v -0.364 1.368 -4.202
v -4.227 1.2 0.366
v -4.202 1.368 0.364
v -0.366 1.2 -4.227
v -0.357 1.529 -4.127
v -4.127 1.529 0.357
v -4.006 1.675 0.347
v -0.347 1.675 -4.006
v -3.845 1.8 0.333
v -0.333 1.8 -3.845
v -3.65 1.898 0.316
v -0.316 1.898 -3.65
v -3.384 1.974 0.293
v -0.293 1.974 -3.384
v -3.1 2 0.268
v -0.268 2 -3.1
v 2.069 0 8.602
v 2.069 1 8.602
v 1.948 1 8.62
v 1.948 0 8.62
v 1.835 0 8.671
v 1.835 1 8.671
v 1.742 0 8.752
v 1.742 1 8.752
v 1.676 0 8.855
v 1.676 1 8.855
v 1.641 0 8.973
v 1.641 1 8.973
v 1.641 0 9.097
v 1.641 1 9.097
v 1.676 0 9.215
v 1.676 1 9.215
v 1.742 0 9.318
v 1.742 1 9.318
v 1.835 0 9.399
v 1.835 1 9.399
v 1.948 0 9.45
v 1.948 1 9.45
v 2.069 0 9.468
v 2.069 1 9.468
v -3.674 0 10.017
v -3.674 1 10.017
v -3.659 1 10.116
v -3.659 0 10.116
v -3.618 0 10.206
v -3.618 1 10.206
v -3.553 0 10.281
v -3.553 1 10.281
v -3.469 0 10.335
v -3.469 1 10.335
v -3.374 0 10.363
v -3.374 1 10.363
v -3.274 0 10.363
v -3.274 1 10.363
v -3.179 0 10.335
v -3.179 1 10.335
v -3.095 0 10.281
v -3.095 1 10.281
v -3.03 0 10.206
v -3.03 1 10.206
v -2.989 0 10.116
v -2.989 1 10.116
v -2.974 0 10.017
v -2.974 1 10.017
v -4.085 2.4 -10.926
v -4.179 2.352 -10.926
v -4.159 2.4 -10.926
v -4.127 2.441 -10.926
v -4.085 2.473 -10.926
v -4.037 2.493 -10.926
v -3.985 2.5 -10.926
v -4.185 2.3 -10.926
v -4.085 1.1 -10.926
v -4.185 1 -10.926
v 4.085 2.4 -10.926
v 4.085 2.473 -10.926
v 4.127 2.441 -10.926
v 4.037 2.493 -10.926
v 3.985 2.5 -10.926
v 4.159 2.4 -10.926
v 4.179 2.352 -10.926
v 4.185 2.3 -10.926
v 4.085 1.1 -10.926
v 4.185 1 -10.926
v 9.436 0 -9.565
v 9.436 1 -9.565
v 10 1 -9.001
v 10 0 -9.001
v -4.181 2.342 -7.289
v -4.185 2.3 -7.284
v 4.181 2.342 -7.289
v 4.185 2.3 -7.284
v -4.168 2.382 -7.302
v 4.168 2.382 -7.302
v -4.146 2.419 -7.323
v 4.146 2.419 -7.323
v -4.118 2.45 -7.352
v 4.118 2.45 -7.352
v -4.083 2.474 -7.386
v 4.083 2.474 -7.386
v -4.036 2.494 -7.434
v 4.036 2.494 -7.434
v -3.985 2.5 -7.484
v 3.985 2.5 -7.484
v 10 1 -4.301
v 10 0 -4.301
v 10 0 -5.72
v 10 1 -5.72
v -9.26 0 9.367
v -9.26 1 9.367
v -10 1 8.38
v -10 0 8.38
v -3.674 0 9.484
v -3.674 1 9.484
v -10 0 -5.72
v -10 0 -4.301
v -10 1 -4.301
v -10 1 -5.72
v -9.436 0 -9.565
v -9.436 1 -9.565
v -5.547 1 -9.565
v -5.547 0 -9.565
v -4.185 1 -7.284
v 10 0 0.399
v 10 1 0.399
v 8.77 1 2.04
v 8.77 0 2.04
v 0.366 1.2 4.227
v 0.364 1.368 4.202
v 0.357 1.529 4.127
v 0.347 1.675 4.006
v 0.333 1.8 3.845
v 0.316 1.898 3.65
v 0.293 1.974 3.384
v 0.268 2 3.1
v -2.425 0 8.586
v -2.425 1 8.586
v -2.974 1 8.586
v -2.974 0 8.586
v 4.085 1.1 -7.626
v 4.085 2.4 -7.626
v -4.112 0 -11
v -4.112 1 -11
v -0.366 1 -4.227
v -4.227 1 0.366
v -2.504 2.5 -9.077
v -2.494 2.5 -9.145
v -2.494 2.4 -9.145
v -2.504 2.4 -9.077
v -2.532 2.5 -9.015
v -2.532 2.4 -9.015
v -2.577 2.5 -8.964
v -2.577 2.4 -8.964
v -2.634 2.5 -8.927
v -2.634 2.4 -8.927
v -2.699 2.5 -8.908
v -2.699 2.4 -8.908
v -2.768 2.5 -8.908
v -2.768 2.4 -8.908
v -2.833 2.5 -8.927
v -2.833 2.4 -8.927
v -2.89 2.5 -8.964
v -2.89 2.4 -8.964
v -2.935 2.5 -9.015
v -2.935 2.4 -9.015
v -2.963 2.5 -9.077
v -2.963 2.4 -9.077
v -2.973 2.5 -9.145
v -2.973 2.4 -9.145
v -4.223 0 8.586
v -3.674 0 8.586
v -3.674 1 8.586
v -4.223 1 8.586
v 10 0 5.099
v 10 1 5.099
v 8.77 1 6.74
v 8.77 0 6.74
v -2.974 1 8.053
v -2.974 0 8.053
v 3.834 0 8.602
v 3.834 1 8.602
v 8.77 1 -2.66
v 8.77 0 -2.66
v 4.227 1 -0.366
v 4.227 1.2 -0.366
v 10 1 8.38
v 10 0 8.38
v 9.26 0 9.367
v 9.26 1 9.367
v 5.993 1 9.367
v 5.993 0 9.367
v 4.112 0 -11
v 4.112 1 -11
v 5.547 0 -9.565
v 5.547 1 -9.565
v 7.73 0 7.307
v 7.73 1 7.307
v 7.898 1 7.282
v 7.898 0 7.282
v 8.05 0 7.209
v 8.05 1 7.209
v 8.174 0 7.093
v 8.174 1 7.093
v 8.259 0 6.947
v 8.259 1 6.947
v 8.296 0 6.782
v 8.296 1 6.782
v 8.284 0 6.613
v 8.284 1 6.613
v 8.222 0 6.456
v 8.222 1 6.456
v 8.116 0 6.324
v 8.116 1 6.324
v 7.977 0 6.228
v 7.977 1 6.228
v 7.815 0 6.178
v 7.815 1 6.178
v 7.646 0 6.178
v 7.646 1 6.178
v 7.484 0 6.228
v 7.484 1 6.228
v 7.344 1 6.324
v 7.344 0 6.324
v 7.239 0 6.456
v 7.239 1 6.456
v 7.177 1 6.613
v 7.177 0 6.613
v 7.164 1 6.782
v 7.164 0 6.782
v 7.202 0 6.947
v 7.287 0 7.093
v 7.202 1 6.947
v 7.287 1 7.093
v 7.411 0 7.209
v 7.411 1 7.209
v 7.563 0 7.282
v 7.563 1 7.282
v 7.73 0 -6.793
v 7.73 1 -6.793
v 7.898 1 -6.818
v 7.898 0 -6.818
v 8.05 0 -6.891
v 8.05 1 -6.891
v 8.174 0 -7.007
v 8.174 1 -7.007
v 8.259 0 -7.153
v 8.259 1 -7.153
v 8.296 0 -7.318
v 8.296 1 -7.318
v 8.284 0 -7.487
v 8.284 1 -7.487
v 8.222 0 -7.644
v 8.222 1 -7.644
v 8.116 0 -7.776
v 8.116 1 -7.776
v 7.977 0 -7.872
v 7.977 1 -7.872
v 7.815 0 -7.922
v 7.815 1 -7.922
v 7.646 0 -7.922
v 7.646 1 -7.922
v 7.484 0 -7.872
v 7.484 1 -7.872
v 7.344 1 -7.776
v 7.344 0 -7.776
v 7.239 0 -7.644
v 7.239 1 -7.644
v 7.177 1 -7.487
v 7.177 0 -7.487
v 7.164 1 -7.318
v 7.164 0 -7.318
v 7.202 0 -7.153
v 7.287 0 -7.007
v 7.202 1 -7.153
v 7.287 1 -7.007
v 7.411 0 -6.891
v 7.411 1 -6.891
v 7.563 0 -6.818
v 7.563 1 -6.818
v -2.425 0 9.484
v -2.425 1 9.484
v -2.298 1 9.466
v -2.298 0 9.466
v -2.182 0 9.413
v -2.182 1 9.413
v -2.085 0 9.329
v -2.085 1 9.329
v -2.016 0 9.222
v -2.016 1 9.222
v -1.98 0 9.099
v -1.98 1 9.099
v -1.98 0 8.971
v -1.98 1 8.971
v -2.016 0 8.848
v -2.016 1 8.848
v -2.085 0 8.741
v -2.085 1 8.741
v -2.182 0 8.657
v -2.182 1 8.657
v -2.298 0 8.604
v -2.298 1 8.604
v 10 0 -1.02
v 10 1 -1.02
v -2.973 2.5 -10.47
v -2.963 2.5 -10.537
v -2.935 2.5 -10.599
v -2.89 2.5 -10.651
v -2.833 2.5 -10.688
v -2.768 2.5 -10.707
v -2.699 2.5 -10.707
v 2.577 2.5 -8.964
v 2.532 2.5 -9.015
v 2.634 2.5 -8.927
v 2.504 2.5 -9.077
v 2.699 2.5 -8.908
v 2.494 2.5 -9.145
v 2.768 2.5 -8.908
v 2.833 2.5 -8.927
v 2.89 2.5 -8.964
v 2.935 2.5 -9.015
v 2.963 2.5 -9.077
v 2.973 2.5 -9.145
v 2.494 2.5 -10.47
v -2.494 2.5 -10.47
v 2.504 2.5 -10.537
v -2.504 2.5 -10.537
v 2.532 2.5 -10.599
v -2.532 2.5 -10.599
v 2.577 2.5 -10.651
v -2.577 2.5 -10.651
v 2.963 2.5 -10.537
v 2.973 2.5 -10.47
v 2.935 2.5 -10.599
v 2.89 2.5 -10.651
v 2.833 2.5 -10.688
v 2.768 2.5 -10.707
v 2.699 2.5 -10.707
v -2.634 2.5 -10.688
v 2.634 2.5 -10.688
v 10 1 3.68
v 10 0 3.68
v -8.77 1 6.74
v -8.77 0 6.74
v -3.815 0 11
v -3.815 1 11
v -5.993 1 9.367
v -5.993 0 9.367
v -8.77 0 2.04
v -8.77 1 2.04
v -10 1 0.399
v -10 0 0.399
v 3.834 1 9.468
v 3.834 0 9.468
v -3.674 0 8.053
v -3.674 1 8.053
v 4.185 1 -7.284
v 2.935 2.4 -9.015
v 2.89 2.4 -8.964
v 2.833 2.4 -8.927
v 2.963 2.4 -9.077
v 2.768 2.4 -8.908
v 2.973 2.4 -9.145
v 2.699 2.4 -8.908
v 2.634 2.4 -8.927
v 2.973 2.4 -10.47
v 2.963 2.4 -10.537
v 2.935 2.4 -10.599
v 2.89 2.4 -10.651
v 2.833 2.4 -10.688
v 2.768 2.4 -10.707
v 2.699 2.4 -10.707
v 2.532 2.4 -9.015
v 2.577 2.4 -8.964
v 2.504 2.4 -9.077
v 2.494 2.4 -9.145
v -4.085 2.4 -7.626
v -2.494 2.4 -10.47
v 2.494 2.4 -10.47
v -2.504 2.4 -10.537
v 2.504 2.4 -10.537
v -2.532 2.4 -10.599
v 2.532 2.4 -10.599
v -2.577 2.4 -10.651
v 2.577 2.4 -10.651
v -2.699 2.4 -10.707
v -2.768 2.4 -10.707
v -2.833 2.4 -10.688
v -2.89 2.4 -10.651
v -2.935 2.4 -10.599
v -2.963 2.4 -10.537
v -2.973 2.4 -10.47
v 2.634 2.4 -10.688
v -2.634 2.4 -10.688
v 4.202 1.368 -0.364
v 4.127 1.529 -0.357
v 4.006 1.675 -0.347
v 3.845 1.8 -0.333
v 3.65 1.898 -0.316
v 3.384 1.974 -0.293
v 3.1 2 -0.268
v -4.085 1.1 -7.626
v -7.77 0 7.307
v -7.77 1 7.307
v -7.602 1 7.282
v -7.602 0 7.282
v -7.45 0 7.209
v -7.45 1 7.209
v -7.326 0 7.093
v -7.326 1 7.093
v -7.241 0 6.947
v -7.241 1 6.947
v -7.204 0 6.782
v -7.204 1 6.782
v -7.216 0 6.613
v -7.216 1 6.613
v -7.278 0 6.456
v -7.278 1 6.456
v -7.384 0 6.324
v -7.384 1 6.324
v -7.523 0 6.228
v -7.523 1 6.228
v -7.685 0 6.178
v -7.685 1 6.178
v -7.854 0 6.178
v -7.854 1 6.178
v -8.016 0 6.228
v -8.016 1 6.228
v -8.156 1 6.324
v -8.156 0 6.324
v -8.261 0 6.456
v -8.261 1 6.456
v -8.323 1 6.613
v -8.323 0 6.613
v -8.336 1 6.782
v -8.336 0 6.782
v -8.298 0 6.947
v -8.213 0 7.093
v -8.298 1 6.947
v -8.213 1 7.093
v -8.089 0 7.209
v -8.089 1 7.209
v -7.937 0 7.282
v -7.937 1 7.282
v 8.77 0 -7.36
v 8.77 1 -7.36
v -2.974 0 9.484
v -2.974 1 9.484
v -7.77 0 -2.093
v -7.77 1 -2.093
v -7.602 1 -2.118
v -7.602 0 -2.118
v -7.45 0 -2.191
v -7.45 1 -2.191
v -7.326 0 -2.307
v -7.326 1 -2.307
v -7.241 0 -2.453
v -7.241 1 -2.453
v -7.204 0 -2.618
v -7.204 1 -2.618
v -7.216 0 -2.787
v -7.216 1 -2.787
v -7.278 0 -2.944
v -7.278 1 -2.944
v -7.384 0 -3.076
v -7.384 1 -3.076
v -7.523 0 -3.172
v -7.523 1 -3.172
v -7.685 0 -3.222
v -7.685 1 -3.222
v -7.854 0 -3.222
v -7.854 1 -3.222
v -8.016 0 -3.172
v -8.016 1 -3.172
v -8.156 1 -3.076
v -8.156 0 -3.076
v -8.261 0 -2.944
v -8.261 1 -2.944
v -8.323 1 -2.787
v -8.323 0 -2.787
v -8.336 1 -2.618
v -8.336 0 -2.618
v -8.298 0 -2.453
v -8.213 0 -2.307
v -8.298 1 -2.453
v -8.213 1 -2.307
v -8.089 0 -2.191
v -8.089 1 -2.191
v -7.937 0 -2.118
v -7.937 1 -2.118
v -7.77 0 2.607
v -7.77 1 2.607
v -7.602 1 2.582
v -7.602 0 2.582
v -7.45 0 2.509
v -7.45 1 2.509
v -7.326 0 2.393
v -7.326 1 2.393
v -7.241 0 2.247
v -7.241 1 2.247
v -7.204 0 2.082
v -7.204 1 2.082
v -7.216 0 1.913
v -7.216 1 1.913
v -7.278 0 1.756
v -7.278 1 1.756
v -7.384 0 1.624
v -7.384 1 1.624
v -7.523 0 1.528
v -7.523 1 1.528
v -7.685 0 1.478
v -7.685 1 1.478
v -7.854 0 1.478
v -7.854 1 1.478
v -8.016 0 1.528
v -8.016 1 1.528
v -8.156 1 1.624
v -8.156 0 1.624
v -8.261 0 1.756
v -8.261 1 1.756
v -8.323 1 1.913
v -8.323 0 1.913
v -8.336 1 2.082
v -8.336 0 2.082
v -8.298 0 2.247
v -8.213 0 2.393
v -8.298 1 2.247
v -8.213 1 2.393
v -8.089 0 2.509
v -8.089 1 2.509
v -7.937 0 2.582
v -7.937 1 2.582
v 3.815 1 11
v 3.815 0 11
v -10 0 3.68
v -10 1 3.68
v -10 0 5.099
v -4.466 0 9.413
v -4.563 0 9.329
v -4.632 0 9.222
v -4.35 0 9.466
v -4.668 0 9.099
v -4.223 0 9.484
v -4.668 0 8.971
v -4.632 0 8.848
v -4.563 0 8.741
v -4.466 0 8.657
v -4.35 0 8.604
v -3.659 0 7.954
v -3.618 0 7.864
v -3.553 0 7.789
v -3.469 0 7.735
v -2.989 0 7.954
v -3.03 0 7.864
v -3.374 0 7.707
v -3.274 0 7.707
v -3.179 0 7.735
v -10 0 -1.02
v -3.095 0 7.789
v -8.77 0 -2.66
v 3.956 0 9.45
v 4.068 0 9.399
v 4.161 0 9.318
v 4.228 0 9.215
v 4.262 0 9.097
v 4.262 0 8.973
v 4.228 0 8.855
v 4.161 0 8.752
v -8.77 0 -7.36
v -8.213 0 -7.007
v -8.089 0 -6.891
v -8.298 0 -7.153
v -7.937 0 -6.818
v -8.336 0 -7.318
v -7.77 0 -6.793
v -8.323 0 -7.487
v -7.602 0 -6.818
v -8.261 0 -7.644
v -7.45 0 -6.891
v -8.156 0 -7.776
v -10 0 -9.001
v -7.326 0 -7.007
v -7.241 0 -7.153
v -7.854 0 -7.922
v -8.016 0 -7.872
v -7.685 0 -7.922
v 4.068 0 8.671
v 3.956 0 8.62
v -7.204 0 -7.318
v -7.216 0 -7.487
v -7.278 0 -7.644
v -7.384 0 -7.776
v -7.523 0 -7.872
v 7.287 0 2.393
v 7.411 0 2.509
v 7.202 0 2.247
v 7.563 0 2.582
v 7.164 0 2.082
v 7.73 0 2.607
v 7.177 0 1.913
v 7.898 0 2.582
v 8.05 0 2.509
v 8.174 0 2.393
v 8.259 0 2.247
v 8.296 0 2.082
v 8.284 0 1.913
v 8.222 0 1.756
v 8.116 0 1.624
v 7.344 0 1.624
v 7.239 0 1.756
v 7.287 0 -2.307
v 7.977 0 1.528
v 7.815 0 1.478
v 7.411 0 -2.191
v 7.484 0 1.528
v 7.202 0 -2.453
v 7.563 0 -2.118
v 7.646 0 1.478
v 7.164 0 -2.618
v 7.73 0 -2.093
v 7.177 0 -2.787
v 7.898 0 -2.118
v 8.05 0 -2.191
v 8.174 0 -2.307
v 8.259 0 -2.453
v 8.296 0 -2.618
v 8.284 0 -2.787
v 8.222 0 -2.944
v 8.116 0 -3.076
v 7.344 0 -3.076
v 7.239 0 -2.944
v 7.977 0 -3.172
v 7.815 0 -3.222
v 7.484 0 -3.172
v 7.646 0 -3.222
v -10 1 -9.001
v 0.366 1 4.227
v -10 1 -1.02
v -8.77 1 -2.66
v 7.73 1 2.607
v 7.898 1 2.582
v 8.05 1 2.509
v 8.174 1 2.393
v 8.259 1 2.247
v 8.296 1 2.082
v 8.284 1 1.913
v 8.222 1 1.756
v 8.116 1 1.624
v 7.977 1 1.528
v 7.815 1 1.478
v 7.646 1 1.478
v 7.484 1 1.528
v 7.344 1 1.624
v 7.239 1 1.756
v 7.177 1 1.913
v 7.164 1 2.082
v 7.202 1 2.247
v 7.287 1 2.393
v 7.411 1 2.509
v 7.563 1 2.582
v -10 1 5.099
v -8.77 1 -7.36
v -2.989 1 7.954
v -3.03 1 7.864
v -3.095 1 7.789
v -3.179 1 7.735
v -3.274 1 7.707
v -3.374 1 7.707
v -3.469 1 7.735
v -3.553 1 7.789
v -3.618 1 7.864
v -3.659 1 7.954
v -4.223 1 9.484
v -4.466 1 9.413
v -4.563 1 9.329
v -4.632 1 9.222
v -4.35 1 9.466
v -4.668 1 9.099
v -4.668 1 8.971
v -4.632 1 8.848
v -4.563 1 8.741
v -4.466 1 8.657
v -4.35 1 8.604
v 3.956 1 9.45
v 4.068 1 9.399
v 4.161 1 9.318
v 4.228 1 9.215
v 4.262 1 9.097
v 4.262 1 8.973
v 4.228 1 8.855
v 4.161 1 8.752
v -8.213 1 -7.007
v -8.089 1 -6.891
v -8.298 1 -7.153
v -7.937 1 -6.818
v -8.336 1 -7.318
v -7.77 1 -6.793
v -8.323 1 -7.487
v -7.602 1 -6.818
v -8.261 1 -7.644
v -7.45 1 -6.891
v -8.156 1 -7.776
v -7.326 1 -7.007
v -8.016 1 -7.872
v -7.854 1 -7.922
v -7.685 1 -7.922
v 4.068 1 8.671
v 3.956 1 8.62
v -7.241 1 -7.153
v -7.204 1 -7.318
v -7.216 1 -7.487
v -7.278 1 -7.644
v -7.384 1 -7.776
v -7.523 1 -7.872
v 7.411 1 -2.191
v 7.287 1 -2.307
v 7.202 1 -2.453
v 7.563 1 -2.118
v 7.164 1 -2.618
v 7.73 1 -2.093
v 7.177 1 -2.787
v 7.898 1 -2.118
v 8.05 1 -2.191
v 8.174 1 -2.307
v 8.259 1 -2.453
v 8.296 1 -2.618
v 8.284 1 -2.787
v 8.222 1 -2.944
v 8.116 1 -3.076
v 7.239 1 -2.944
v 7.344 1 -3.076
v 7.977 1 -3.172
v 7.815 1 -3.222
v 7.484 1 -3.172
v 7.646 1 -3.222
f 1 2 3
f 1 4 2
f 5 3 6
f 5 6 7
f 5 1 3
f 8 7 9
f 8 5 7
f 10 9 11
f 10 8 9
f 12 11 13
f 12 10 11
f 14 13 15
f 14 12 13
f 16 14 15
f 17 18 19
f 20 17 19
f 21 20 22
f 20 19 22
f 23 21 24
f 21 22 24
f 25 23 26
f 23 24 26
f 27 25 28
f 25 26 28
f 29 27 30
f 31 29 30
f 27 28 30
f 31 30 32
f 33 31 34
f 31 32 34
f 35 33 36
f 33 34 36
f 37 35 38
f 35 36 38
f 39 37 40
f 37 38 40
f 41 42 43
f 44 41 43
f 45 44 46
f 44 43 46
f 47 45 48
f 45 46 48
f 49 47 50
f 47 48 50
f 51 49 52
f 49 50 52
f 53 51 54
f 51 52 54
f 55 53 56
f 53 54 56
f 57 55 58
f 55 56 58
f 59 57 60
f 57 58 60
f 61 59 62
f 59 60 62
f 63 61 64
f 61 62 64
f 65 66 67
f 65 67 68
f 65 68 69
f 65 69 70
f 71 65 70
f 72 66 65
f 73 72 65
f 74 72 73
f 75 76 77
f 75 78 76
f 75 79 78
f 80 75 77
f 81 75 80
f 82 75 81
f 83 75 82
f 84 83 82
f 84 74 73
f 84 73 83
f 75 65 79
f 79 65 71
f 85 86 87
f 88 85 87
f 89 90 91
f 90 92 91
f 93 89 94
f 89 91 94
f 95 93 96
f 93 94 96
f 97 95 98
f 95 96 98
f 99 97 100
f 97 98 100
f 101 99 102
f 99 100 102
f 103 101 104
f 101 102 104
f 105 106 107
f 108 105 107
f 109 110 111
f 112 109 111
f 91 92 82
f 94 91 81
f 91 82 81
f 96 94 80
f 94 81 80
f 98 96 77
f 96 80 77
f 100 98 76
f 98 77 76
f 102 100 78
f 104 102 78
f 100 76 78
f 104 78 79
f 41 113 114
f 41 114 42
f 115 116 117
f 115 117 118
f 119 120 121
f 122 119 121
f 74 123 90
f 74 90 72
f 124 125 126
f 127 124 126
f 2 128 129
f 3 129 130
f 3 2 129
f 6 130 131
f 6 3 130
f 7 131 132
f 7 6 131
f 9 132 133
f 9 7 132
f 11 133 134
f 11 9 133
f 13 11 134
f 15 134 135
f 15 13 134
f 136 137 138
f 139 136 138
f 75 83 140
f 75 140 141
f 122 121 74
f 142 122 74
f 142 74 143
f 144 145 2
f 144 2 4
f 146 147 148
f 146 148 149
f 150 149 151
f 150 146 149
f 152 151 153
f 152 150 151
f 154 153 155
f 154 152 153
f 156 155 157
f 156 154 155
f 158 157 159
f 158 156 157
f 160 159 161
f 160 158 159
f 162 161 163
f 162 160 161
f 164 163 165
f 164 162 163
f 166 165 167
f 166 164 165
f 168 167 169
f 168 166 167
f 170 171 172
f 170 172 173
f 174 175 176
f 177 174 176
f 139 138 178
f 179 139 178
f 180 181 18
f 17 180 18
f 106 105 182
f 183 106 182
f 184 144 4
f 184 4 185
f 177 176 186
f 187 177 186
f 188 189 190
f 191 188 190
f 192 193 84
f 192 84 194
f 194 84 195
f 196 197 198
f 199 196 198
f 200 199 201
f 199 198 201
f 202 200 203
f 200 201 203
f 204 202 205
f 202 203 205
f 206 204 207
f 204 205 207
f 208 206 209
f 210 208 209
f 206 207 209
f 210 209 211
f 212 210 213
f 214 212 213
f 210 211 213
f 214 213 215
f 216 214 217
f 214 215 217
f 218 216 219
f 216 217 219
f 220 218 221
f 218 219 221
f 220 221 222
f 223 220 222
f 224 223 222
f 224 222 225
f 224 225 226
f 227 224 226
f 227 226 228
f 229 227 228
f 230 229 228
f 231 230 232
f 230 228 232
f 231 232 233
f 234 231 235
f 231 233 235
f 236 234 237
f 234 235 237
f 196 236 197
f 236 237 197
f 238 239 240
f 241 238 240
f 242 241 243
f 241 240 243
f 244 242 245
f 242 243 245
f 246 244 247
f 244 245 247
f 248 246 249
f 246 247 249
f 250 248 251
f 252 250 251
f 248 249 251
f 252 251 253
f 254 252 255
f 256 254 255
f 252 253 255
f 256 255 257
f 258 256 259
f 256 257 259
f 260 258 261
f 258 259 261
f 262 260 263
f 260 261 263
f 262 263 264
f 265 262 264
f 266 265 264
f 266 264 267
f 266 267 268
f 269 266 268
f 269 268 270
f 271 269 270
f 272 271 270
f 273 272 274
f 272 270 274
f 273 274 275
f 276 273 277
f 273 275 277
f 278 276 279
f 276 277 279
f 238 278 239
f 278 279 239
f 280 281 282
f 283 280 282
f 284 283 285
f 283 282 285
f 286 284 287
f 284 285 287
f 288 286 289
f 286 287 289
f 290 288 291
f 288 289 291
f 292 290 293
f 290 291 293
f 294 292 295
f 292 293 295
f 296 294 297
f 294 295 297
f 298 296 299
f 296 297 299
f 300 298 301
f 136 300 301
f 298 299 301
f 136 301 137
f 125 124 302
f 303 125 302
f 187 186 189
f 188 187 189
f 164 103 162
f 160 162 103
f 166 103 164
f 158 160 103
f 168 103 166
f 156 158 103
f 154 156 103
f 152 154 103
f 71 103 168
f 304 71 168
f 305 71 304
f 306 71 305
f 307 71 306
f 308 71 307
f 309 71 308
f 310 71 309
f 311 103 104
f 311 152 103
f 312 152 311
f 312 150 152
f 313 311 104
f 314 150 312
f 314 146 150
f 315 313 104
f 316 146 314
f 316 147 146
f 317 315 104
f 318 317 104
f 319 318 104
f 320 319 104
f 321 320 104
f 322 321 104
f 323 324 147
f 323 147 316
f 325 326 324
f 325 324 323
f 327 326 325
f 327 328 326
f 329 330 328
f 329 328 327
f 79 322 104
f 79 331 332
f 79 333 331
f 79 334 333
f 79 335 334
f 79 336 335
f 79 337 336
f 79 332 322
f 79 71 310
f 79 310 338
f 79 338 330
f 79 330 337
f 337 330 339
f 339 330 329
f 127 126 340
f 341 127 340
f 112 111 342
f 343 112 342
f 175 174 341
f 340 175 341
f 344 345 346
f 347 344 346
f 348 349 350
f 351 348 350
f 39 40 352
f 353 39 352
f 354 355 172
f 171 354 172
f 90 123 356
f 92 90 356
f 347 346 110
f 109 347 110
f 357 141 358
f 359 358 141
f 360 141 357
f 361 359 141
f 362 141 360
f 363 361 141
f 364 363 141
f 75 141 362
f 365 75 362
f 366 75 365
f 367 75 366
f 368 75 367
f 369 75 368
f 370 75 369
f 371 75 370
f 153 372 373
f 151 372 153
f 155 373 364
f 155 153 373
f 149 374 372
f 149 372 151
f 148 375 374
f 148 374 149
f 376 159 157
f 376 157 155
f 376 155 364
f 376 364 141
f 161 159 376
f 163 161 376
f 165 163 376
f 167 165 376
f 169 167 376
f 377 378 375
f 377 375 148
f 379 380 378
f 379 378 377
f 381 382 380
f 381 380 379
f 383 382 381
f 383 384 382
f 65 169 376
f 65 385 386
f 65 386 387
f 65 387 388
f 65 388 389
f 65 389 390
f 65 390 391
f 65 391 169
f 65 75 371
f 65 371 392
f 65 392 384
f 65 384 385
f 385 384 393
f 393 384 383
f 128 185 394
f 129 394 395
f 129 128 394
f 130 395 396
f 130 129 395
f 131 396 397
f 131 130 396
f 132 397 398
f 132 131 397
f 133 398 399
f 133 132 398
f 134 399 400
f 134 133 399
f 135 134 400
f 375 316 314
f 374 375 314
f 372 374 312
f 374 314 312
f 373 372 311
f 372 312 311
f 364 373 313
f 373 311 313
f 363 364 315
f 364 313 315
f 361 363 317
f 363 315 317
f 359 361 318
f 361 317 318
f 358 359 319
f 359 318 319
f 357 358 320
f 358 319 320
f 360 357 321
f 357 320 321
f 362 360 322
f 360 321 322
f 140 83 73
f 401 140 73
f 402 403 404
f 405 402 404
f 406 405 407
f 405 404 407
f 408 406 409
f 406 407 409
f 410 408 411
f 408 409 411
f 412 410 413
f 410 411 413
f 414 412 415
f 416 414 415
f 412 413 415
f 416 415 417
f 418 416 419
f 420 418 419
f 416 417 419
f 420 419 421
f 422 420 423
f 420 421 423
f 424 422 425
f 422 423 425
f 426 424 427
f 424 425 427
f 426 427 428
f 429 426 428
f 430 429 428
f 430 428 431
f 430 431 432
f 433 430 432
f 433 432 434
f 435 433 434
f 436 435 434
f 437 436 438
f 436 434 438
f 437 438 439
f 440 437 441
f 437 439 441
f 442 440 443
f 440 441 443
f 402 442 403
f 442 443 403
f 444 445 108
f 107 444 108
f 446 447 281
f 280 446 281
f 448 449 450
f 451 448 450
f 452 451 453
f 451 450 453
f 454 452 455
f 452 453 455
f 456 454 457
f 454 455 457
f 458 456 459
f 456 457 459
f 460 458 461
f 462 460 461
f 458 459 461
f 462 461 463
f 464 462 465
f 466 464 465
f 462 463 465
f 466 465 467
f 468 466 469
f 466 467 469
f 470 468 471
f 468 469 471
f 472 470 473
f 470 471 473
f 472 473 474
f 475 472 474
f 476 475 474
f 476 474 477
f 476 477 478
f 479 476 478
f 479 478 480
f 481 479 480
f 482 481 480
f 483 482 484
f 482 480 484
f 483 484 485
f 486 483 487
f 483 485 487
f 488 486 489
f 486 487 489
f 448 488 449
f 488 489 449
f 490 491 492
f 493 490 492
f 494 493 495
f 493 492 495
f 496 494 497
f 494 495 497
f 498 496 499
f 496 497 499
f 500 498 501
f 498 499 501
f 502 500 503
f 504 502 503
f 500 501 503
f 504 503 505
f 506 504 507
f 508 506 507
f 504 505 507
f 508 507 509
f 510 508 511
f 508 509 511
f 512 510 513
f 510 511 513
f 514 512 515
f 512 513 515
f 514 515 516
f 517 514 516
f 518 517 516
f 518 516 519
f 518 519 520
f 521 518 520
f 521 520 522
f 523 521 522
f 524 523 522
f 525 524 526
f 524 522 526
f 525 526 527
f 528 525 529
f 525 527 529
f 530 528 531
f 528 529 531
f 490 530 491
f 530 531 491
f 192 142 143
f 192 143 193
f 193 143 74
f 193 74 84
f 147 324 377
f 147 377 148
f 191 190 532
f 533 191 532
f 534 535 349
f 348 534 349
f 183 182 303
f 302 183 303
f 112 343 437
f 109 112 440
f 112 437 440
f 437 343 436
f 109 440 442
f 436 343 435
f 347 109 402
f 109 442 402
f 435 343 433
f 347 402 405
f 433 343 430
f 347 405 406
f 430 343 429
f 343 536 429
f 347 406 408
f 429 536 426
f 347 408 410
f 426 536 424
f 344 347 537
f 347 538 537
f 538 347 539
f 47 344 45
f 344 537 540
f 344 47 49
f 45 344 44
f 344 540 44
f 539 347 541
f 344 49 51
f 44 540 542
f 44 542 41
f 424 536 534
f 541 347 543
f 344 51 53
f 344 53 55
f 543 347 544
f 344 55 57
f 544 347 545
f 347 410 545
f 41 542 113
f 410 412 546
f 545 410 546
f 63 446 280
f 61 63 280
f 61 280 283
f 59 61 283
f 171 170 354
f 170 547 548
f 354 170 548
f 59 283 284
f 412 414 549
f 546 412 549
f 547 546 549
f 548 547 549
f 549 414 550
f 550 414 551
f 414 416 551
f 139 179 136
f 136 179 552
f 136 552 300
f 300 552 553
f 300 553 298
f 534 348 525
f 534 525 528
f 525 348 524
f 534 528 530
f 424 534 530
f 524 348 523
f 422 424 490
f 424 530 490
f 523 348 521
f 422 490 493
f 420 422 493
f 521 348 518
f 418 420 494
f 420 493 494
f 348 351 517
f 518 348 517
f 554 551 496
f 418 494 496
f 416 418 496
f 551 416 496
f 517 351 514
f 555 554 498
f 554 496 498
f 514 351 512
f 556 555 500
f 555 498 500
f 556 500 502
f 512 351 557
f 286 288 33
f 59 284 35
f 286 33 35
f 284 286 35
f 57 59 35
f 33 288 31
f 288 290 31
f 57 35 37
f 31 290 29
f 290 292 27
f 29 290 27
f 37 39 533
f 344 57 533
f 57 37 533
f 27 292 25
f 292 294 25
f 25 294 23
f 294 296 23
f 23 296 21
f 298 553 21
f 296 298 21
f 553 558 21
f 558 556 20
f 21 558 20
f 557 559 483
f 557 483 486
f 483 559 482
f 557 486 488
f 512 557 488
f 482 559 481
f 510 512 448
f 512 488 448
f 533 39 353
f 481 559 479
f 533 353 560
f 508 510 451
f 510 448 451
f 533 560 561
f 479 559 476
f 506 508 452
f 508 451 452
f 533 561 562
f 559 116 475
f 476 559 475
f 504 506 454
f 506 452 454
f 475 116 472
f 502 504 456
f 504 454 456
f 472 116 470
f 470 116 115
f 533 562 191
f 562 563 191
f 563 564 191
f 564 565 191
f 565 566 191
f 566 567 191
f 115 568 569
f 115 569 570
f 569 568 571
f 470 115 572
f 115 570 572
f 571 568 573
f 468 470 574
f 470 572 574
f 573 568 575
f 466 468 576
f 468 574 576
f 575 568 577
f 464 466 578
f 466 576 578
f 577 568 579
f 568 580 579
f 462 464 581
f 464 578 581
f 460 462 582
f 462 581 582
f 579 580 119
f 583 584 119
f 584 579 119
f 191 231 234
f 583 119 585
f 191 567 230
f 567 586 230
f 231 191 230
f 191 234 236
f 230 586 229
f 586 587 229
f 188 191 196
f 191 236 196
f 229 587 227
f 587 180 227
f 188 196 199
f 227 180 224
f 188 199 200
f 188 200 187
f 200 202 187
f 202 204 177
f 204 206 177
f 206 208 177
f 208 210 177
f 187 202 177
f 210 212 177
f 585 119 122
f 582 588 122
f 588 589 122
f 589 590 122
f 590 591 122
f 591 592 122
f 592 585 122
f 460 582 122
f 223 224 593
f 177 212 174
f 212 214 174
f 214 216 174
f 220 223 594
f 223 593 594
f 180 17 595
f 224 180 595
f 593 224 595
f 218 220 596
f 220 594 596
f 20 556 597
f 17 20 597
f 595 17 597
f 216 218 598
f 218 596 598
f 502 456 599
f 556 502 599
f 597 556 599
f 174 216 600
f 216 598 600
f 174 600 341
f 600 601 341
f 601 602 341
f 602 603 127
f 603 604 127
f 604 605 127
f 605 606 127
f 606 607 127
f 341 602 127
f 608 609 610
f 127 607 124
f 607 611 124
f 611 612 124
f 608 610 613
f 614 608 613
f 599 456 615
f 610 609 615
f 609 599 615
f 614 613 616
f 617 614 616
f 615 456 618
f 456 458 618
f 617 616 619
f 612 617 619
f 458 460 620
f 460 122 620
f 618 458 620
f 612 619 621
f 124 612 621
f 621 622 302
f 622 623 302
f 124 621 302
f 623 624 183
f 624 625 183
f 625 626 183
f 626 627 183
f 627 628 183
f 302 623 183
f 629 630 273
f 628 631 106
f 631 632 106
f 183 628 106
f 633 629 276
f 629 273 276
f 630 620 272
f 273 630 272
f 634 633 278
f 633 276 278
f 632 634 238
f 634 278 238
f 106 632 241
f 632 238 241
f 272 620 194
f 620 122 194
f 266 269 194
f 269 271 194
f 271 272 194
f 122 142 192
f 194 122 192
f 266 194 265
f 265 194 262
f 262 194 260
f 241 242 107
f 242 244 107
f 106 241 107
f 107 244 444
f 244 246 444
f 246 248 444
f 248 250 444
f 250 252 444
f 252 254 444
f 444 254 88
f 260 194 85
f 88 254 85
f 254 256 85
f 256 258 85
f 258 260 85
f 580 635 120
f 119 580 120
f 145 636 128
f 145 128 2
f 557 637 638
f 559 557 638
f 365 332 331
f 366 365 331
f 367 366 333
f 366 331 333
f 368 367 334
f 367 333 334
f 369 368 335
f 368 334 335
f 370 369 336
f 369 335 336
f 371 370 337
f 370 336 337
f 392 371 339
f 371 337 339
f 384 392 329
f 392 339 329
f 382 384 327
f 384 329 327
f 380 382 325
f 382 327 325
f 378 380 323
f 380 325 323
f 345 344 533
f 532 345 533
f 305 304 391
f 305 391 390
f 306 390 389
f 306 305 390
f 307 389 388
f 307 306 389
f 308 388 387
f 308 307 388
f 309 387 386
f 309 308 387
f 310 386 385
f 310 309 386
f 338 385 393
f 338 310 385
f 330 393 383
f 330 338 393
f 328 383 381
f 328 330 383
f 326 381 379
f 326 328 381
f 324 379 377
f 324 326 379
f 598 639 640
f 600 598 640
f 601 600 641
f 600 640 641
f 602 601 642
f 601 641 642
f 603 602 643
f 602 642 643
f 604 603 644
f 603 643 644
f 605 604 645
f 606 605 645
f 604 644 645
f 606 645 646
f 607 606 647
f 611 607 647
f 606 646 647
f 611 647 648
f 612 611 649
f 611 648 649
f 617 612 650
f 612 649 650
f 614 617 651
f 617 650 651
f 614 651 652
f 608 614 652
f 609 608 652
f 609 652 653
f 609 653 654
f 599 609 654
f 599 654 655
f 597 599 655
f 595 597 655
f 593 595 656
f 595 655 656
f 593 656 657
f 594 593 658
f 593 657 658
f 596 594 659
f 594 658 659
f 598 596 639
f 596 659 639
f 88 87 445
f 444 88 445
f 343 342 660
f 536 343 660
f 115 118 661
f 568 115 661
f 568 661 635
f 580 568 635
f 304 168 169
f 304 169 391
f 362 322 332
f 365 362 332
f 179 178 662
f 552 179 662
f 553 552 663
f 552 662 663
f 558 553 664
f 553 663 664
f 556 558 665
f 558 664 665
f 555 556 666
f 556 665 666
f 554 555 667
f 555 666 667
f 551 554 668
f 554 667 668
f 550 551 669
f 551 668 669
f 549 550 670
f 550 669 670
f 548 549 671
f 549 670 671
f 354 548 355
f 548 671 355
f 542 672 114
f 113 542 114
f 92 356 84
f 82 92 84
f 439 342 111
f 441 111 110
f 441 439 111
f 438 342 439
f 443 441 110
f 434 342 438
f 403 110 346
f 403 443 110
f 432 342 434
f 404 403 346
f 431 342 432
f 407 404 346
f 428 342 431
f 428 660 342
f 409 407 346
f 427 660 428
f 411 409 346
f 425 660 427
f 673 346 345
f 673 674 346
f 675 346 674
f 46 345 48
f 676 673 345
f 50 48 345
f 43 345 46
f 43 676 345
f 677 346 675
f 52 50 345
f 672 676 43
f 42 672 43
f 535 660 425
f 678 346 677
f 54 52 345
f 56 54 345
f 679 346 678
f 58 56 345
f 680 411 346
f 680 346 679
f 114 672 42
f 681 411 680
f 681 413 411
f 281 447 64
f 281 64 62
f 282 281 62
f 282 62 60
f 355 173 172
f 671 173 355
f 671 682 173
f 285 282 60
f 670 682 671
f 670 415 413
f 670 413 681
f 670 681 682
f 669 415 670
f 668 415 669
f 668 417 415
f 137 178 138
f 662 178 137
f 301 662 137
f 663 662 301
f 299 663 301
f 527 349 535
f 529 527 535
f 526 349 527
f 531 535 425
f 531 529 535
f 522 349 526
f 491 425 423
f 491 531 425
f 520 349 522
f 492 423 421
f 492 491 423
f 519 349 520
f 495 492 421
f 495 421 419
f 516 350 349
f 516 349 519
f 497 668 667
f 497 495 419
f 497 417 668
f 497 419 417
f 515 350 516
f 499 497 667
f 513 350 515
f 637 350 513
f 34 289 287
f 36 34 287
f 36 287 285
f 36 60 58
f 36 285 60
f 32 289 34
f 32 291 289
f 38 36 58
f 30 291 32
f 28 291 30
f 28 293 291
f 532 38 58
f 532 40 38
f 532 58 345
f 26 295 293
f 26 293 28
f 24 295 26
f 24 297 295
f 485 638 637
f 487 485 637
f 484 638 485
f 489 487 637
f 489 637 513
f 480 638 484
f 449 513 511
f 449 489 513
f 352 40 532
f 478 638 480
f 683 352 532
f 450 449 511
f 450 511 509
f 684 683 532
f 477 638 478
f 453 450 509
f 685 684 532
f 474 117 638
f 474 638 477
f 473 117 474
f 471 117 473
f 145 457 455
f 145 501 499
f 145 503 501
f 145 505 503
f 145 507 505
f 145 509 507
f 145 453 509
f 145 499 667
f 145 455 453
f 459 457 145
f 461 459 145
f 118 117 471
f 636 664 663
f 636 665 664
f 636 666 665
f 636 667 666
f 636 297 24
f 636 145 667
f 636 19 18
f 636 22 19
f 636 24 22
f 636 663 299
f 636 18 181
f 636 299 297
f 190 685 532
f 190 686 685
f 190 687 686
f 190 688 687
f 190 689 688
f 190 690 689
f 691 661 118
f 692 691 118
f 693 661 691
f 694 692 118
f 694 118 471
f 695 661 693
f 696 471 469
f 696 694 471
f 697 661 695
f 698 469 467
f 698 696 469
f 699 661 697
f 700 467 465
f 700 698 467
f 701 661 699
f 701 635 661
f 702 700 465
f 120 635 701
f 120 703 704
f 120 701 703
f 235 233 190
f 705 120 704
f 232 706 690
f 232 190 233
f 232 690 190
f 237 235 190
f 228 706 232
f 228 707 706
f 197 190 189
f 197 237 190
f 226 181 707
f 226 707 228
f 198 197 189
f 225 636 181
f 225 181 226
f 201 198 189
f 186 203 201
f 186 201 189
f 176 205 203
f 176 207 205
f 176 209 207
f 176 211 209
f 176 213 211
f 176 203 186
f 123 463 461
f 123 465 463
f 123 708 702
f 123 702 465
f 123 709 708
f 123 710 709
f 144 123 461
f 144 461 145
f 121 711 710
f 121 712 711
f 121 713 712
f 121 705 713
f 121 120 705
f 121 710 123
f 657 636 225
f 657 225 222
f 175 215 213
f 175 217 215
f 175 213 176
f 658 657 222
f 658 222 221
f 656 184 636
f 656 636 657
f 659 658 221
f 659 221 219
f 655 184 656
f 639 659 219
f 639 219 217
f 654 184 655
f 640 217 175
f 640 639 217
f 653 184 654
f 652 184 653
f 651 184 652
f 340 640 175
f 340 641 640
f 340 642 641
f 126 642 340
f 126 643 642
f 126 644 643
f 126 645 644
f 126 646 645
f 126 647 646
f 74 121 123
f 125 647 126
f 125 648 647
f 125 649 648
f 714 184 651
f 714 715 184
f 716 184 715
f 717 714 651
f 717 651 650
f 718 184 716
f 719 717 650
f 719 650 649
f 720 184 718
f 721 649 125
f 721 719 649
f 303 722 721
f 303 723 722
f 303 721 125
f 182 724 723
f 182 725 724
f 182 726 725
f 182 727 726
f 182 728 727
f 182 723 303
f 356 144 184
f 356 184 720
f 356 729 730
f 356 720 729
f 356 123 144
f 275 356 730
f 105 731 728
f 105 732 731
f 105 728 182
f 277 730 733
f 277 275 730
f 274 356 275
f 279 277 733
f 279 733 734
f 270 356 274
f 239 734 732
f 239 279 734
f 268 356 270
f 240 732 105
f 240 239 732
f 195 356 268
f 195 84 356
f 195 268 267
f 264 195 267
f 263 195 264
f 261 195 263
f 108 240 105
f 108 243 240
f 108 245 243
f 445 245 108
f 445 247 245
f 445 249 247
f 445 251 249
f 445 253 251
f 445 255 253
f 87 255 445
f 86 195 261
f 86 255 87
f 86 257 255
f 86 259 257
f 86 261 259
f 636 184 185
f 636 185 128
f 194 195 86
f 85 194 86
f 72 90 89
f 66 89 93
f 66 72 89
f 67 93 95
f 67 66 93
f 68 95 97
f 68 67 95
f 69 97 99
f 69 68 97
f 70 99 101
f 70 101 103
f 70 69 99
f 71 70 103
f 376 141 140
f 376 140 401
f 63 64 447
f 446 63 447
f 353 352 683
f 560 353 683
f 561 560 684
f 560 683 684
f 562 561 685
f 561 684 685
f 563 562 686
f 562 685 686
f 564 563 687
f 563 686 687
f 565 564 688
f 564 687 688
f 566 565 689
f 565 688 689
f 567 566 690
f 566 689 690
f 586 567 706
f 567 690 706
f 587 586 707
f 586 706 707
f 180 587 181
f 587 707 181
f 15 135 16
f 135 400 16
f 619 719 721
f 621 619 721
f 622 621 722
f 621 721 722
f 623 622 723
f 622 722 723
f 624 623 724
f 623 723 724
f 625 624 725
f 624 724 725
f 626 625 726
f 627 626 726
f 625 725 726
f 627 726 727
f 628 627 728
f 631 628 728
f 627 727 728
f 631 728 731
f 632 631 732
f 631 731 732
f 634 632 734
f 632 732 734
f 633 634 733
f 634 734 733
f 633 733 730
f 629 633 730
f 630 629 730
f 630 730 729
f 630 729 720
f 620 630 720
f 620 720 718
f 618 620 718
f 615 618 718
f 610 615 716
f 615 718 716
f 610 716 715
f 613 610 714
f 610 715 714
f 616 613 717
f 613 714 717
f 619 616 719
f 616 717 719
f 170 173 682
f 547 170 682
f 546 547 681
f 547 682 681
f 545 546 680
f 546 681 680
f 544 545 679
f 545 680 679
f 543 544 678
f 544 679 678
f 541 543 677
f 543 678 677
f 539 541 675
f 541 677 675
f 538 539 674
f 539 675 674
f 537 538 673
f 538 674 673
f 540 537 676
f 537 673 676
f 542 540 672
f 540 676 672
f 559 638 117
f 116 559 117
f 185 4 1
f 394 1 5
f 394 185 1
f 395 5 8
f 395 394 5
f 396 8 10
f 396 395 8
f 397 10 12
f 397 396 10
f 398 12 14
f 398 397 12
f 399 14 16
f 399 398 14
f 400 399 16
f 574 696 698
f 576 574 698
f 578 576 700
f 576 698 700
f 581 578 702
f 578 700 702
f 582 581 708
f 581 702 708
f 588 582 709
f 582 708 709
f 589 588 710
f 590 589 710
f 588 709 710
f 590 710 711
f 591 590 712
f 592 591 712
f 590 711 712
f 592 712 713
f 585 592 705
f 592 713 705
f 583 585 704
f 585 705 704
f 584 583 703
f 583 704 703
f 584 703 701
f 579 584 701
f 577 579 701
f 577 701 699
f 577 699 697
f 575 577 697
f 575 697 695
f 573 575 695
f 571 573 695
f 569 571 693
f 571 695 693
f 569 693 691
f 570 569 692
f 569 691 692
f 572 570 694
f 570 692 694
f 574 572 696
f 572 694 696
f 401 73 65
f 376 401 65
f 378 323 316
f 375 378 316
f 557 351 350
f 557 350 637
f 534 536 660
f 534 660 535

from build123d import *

# Parameters (mm, degrees)
SKETCH1_W            = 20
SKETCH1_H            = 22
BOSS_EXTRUDE1_DEPTH  = 1
CUT_EXTRUDE1_DEPTH   = 2
CUT_EXTRUDE2_DEPTH   = 2
LPATTERN1_COUNT      = 4
LPATTERN1_PITCH      = 4.7
CUT_EXTRUDE3_DEPTH   = 2
SKETCH4_W            = 8.370709726
SKETCH4_H            = 3.642153613
BOSS_EXTRUDE2_DEPTH  = 1.5
SKETCH5_W            = 8.170709726
SKETCH5_H            = 1.3
CUT_EXTRUDE4_DEPTH   = 3.3
CUT_EXTRUDE5_DEPTH   = 1
FILLET1_R            = 0.2
SKETCH7_R            = 0.567557538
CUT_EXTRUDE6_DEPTH   = 1
LPATTERN2_COUNT      = 4
LPATTERN2_PITCH      = 4.7
LPATTERN2_COUNT_DIR2 = 2
LPATTERN2_PITCH_DIR2 = 15.5
BOSS_EXTRUDE3_DEPTH  = 1
FILLET2_R            = 0.8
CUT_EXTRUDE14_DEPTH  = 11


with BuildPart() as part:
    # Sketch1 → Boss-Extrude1 (new body)
    with BuildSketch(Plane(origin=(0, 0, 0), x_dir=(1, 0, 0), z_dir=(0, 1, 0))):
        Rectangle(SKETCH1_W, SKETCH1_H)
    extrude(amount=BOSS_EXTRUDE1_DEPTH)

    # Sketch2 → Cut-Extrude1 (cut)
    with BuildSketch(Plane(origin=(0, 1, 0), x_dir=(1, 0, 0), z_dir=(0, 1, 0))):
        Polygon((5.992999925, -9.366600626), (3.81466663, -11), (10, -11), (10, -8.38038881), (9.260499866, -9.366600626), align=None)
        Polygon((-10, -11), (-3.81466663, -11), (-5.992999925, -9.366600626), (-9.260499866, -9.366600626), (-10, -8.38038881), align=None)
    extrude(amount=-CUT_EXTRUDE1_DEPTH, mode=Mode.SUBTRACT)

    # Sketch2<3> → Cut-Extrude2 (cut)
    with BuildSketch(Plane(origin=(0, 1, 0), x_dir=(1, 0, 0), z_dir=(0, 1, 0))):
        Polygon((8.769646289, -6.739565081), (10, -8.38038881), (10, -5.098741352), align=None)
        Polygon((-10, -5.098741352), (-10, -8.38038881), (-8.769646289, -6.739565081), align=None)
    cut_extrude2 = extrude(amount=-CUT_EXTRUDE2_DEPTH, mode=Mode.SUBTRACT)

    # LPattern1: Cut-Extrude2 ×4
    with Locations(*[(0, 0, -i * LPATTERN1_PITCH) for i in range(1, LPATTERN1_COUNT)]):
        add(cut_extrude2, mode=Mode.SUBTRACT)

    # Sketch3 → Cut-Extrude3 (cut)
    with BuildSketch(Plane(origin=(0, 1, 0), x_dir=(1, 0, 0), z_dir=(0, 1, 0))):
        Polygon((-5.546503539, 9.56506288), (-4.111566419, 11), (-10, 11), (-10, 9.001258648), (-9.436195769, 9.56506288), align=None)
        Polygon((9.436195769, 9.56506288), (10, 9.001258648), (10, 11), (4.111566419, 11), (5.546503539, 9.56506288), align=None)
    extrude(amount=-CUT_EXTRUDE3_DEPTH, mode=Mode.SUBTRACT)

    # Sketch4 → Boss-Extrude2 (add)
    with BuildSketch(Plane(origin=(0, 1, 0), x_dir=(1, 0, 0), z_dir=(0, 1, 0))):
        with Locations((0, 9.105134748)):
            Rectangle(SKETCH4_W, SKETCH4_H)
    extrude(amount=BOSS_EXTRUDE2_DEPTH)

    # Sketch5 → Cut-Extrude4 (cut)
    with BuildSketch(Plane(origin=(0, 0, -10.926211555), x_dir=(-1, 0, 0), z_dir=(0, 0, -1))):
        with Locations((0, 1.75)):
            Rectangle(SKETCH5_W, SKETCH5_H)
    extrude(amount=-CUT_EXTRUDE4_DEPTH, mode=Mode.SUBTRACT)

    # Sketch6 → Cut-Extrude5 (cut)
    with BuildSketch(Plane(origin=(0, 2.5, 0), x_dir=(1, 0, 0), z_dir=(0, 1, 0))):
        with BuildLine():
            Line((-2.493852215, 10.469900747), (-2.493852215, 9.144845176))
            ThreePointArc((-2.493852215, 9.144845176), (-2.733489924, 8.905207467), (-2.973127634, 9.144845176))
            Line((-2.973127634, 9.144845176), (-2.973127634, 10.469900747))
            ThreePointArc((-2.973127634, 10.469900747), (-2.733489924, 10.709538456), (-2.493852215, 10.469900747))
        make_face()
        with BuildLine():
            Line((2.493852215, 10.469900747), (2.493852215, 9.144845176))
            ThreePointArc((2.493852215, 9.144845176), (2.733489924, 8.905207467), (2.973127634, 9.144845176))
            Line((2.973127634, 9.144845176), (2.973127634, 10.469900747))
            ThreePointArc((2.973127634, 10.469900747), (2.733489924, 10.709538456), (2.493852215, 10.469900747))
        make_face()
    extrude(amount=-CUT_EXTRUDE5_DEPTH, mode=Mode.SUBTRACT)

    # Fillet1
    fillet1_edges = [part.edges().sort_by_distance(p)[0] for p in [
        (4.185354863, 2.5, -9.105134749),
        (0, 2.5, -7.284057942),
        (-4.185354863, 2.5, -9.105134749),
    ]]
    fillet(fillet1_edges, radius=FILLET1_R)

    # Sketch7 → Cut-Extrude6 (cut)
    with BuildSketch(Plane(origin=(0, 1, 0), x_dir=(1, 0, 0), z_dir=(0, 1, 0))):
        with Locations((-7.769646289, -6.739565081)):
            Circle(SKETCH7_R)
    cut_extrude6 = extrude(amount=-CUT_EXTRUDE6_DEPTH, mode=Mode.SUBTRACT)

    # LPattern2: Cut-Extrude6 4 × 2
    with Locations(*[(j * LPATTERN2_PITCH_DIR2, 0, -i * LPATTERN2_PITCH) for i in range(LPATTERN2_COUNT) for j in range(LPATTERN2_COUNT_DIR2) if (i, j) != (0, 0)]):
        add(cut_extrude6, mode=Mode.SUBTRACT)

    # Sketch8 → Boss-Extrude3 (add)
    with BuildSketch(Plane(origin=(0, 1, 0), x_dir=(1, 0, 0), z_dir=(0, 1, 0))):
        Polygon((-4.226815495, -0.36610213), (-0.36610213, 4.226815495), (4.226815495, 0.36610213), (0.36610213, -4.226815495), align=None)
    extrude(amount=BOSS_EXTRUDE3_DEPTH)

    # Fillet2
    fillet2_edges = [part.edges().sort_by_distance(p)[0] for p in [
        (-2.296458812, 2, -1.930356683),
        (1.930356683, 2, -2.296458812),
        (2.296458812, 2, 1.930356683),
        (-1.930356683, 2, 2.296458812),
    ]]
    fillet(fillet2_edges, radius=FILLET2_R)

    # Sketch10 → Cut-Extrude14 (cut)
    with BuildSketch(Plane(origin=(0, 2, 0), x_dir=(1, 0, 0), z_dir=(0, 1, 0))):
        with BuildLine():
            Line((-3.673604306, -8.585549508), (-4.222941213, -8.585549508))
            ThreePointArc((-4.222941213, -8.585549508), (-4.672398683, -9.035006978), (-4.222941213, -9.484464447))
            Line((-4.222941213, -9.484464447), (-3.673604306, -9.484464447))
            Line((-3.673604306, -9.484464447), (-3.673604306, -10.017154782))
            ThreePointArc((-3.673604306, -10.017154782), (-3.324026274, -10.366732814), (-2.974448243, -10.017154782))
            Line((-2.974448243, -10.017154782), (-2.974448243, -9.484464447))
            Line((-2.974448243, -9.484464447), (-2.425111335, -9.484464447))
            ThreePointArc((-2.425111335, -9.484464447), (-1.975653866, -9.035006978), (-2.425111335, -8.585549508))
            Line((-2.425111335, -8.585549508), (-2.974448243, -8.585549508))
            Line((-2.974448243, -8.585549508), (-2.974448243, -8.052859174))
            ThreePointArc((-2.974448243, -8.052859174), (-3.324026274, -7.703281142), (-3.673604306, -8.052859174))
            Line((-3.673604306, -8.052859174), (-3.673604306, -8.585549508))
        make_face()
        with BuildLine():
            Line((3.834000092, -8.602196081), (2.06946336, -8.602196081))
            ThreePointArc((2.06946336, -8.602196081), (1.636652464, -9.035006978), (2.06946336, -9.467817874))
            Line((2.06946336, -9.467817874), (3.834000092, -9.467817874))
            ThreePointArc((3.834000092, -9.467817874), (4.266810989, -9.035006978), (3.834000092, -8.602196081))
        make_face()
    extrude(amount=-CUT_EXTRUDE14_DEPTH, mode=Mode.SUBTRACT)


solid = part.part
